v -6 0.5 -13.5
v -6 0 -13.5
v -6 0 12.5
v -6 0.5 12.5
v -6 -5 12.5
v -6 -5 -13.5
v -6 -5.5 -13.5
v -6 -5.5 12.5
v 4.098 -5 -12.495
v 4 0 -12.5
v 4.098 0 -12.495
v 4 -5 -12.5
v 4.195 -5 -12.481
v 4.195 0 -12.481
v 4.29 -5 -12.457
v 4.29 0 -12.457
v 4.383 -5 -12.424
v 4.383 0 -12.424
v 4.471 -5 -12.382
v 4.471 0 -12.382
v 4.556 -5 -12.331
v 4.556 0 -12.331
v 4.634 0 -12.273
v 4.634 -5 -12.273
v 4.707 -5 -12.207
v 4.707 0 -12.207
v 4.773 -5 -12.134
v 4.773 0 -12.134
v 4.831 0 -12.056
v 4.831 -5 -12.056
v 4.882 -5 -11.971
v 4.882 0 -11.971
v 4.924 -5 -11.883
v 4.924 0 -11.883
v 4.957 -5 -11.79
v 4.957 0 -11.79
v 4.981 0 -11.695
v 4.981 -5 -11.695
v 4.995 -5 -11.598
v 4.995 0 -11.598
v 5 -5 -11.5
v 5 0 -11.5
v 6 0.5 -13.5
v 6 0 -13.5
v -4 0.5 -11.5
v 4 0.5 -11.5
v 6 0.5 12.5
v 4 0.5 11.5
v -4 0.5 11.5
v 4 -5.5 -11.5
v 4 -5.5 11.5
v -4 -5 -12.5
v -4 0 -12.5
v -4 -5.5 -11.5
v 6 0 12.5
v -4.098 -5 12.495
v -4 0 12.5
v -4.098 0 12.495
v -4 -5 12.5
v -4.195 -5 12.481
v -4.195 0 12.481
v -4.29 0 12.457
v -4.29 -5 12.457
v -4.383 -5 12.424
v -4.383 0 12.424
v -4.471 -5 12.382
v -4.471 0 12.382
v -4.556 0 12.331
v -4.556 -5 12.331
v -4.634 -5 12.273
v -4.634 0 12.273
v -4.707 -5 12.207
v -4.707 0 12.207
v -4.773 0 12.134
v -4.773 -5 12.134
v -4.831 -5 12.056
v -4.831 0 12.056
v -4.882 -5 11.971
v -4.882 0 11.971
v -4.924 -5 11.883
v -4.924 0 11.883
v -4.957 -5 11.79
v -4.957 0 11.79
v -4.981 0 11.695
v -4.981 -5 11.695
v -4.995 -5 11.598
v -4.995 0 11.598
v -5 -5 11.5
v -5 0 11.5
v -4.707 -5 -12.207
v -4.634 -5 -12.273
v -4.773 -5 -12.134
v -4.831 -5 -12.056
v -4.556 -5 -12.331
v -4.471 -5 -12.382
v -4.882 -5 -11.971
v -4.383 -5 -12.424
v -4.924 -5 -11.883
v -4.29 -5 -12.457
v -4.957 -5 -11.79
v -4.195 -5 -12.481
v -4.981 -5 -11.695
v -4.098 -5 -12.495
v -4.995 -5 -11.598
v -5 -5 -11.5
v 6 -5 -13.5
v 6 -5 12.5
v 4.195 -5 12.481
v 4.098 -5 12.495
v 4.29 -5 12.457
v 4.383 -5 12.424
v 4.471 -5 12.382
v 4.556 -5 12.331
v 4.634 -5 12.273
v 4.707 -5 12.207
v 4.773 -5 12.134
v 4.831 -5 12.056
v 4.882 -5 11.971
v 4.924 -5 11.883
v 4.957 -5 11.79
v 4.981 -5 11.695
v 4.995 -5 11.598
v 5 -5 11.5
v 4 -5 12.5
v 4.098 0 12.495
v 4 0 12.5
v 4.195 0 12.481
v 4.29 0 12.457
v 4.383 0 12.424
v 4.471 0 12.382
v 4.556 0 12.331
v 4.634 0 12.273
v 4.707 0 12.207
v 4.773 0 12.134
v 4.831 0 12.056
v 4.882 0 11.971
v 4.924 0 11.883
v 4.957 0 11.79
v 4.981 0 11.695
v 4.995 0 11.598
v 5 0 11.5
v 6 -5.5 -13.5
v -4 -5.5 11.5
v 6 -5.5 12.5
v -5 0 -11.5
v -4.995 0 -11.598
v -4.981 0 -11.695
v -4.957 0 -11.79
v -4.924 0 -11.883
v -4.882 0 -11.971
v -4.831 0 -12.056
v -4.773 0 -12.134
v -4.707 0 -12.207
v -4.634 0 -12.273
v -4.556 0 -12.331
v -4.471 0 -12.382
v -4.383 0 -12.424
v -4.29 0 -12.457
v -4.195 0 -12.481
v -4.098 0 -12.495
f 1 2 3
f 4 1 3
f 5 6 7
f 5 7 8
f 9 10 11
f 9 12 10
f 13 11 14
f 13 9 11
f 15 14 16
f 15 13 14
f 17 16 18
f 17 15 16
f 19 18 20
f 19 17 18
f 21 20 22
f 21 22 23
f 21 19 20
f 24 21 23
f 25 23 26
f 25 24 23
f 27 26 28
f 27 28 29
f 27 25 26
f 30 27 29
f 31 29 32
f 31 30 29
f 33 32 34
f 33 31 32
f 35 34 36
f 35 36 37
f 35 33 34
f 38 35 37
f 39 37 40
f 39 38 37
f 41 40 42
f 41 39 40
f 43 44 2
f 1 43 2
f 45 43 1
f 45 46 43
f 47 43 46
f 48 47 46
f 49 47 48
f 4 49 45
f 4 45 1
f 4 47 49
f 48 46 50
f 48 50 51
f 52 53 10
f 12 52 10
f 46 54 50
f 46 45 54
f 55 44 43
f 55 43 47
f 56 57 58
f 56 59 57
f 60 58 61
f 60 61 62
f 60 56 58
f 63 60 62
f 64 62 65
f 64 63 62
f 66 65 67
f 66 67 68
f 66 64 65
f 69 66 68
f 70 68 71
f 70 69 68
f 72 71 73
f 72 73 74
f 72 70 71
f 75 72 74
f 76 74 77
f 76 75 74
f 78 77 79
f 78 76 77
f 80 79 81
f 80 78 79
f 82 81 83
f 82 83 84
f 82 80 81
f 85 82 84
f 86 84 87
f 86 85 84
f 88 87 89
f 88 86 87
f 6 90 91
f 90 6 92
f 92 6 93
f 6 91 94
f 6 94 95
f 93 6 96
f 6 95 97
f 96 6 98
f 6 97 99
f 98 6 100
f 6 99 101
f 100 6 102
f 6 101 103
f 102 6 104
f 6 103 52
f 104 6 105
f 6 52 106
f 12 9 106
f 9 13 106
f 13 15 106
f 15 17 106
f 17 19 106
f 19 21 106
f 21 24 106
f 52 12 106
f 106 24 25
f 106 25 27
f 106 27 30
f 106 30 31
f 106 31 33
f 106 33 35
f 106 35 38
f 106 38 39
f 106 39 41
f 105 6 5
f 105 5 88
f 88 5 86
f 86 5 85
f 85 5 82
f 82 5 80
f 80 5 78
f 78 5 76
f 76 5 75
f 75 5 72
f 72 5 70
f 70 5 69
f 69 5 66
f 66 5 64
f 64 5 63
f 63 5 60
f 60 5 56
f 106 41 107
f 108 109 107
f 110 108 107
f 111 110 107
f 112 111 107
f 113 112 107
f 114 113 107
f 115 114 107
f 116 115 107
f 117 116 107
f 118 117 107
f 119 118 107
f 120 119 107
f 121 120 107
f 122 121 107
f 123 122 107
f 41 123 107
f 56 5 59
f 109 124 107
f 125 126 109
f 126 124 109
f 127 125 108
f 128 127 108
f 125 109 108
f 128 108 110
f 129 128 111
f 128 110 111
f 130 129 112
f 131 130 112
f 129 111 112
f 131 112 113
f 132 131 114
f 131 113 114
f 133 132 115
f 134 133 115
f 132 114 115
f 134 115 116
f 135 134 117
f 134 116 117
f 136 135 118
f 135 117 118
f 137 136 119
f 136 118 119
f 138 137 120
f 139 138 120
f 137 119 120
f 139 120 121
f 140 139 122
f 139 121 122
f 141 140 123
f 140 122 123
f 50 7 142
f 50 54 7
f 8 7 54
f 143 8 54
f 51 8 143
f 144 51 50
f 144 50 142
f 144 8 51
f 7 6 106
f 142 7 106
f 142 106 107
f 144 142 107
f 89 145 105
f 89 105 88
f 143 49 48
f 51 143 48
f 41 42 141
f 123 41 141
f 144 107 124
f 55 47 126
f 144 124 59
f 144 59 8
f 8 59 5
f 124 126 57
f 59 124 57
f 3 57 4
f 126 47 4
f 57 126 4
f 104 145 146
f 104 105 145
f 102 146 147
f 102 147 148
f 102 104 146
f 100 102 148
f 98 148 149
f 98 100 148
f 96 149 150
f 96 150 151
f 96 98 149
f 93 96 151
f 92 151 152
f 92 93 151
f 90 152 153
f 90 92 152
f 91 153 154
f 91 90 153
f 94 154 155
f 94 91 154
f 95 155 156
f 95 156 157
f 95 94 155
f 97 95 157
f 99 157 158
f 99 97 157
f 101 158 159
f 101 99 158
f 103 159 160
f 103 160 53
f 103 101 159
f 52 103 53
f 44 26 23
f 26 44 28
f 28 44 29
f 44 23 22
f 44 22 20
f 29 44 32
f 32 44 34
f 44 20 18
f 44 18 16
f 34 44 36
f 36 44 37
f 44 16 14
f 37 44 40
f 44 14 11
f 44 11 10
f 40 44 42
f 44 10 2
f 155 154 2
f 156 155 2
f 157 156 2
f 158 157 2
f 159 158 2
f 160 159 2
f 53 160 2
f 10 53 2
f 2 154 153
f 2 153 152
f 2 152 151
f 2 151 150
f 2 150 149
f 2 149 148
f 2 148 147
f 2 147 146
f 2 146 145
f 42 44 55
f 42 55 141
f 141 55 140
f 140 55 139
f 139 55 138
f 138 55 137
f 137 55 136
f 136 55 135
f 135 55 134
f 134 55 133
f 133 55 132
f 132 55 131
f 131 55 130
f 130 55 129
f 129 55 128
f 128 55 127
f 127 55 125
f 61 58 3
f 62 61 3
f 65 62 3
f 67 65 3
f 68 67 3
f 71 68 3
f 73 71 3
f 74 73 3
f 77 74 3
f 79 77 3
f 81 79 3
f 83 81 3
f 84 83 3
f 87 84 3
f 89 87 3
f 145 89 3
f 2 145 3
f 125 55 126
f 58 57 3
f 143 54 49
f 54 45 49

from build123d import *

# Parameters (mm, degrees)
F0_W     = 10
F0_H     = 25
F0_W_2   = 8
F0_H_2   = 23
F1_DEPTH = 5
F2_W     = 12
F2_H     = 27
F2_W_2   = 10
F2_H_2   = 25
F2_W_3   = 8
F2_H_3   = 23
F3_DEPTH = 0.5
F4_W     = 12
F4_H     = 27
F4_W_2   = 10
F4_H_2   = 25
F4_W_3   = 8
F4_H_3   = 23
F5_DEPTH = 0.5
F7_W     = 12
F7_H     = 1
F8_DEPTH = 25
F9_R     = 1


with BuildPart() as f1:
    # F0 (on Front) → F1 (new body)
    with BuildSketch(Plane.XZ):
        Rectangle(F0_W, F0_H)
        Rectangle(F0_W_2, F0_H_2, mode=Mode.SUBTRACT)
    extrude(amount=F1_DEPTH)

    # F2 (on face) → F3 (join)
    with BuildSketch(Plane(origin=(0, 0, 0), x_dir=(-1, 0, 0), z_dir=(0, 1, 0))):
        Rectangle(F2_W, F2_H)
        Rectangle(F2_W_2, F2_H_2, mode=Mode.SUBTRACT)
        Rectangle(F2_W_2, F2_H_2)
        Rectangle(F2_W_3, F2_H_3, mode=Mode.SUBTRACT)
    extrude(amount=F3_DEPTH)

    # F4 (on face) → F5 (join)
    with BuildSketch(Plane.XZ.offset(5)):
        Rectangle(F4_W, F4_H)
        Rectangle(F4_W_2, F4_H_2, mode=Mode.SUBTRACT)
        Rectangle(F4_W_2, F4_H_2)
        Rectangle(F4_W_3, F4_H_3, mode=Mode.SUBTRACT)
    extrude(amount=F5_DEPTH)

    # F7 (on face) → F8 (cut)
    with BuildSketch(Plane(origin=(0, 0.5, 0), x_dir=(-1, 0, 0), z_dir=(0, 1, 0))):
        with Locations((0, 13)):
            Rectangle(F7_W, F7_H)
    extrude(amount=-F8_DEPTH, mode=Mode.SUBTRACT)

    # F9
    f9_edges = [f1.edges().sort_by_distance(p)[0] for p in [
        (-5, -2.5, 12.5),
        (5, -2.5, 12.5),
        (-5, -2.5, -12.5),
        (5, -2.5, -12.5),
    ]]
    fillet(f9_edges, radius=F9_R)


solid = f1.part
